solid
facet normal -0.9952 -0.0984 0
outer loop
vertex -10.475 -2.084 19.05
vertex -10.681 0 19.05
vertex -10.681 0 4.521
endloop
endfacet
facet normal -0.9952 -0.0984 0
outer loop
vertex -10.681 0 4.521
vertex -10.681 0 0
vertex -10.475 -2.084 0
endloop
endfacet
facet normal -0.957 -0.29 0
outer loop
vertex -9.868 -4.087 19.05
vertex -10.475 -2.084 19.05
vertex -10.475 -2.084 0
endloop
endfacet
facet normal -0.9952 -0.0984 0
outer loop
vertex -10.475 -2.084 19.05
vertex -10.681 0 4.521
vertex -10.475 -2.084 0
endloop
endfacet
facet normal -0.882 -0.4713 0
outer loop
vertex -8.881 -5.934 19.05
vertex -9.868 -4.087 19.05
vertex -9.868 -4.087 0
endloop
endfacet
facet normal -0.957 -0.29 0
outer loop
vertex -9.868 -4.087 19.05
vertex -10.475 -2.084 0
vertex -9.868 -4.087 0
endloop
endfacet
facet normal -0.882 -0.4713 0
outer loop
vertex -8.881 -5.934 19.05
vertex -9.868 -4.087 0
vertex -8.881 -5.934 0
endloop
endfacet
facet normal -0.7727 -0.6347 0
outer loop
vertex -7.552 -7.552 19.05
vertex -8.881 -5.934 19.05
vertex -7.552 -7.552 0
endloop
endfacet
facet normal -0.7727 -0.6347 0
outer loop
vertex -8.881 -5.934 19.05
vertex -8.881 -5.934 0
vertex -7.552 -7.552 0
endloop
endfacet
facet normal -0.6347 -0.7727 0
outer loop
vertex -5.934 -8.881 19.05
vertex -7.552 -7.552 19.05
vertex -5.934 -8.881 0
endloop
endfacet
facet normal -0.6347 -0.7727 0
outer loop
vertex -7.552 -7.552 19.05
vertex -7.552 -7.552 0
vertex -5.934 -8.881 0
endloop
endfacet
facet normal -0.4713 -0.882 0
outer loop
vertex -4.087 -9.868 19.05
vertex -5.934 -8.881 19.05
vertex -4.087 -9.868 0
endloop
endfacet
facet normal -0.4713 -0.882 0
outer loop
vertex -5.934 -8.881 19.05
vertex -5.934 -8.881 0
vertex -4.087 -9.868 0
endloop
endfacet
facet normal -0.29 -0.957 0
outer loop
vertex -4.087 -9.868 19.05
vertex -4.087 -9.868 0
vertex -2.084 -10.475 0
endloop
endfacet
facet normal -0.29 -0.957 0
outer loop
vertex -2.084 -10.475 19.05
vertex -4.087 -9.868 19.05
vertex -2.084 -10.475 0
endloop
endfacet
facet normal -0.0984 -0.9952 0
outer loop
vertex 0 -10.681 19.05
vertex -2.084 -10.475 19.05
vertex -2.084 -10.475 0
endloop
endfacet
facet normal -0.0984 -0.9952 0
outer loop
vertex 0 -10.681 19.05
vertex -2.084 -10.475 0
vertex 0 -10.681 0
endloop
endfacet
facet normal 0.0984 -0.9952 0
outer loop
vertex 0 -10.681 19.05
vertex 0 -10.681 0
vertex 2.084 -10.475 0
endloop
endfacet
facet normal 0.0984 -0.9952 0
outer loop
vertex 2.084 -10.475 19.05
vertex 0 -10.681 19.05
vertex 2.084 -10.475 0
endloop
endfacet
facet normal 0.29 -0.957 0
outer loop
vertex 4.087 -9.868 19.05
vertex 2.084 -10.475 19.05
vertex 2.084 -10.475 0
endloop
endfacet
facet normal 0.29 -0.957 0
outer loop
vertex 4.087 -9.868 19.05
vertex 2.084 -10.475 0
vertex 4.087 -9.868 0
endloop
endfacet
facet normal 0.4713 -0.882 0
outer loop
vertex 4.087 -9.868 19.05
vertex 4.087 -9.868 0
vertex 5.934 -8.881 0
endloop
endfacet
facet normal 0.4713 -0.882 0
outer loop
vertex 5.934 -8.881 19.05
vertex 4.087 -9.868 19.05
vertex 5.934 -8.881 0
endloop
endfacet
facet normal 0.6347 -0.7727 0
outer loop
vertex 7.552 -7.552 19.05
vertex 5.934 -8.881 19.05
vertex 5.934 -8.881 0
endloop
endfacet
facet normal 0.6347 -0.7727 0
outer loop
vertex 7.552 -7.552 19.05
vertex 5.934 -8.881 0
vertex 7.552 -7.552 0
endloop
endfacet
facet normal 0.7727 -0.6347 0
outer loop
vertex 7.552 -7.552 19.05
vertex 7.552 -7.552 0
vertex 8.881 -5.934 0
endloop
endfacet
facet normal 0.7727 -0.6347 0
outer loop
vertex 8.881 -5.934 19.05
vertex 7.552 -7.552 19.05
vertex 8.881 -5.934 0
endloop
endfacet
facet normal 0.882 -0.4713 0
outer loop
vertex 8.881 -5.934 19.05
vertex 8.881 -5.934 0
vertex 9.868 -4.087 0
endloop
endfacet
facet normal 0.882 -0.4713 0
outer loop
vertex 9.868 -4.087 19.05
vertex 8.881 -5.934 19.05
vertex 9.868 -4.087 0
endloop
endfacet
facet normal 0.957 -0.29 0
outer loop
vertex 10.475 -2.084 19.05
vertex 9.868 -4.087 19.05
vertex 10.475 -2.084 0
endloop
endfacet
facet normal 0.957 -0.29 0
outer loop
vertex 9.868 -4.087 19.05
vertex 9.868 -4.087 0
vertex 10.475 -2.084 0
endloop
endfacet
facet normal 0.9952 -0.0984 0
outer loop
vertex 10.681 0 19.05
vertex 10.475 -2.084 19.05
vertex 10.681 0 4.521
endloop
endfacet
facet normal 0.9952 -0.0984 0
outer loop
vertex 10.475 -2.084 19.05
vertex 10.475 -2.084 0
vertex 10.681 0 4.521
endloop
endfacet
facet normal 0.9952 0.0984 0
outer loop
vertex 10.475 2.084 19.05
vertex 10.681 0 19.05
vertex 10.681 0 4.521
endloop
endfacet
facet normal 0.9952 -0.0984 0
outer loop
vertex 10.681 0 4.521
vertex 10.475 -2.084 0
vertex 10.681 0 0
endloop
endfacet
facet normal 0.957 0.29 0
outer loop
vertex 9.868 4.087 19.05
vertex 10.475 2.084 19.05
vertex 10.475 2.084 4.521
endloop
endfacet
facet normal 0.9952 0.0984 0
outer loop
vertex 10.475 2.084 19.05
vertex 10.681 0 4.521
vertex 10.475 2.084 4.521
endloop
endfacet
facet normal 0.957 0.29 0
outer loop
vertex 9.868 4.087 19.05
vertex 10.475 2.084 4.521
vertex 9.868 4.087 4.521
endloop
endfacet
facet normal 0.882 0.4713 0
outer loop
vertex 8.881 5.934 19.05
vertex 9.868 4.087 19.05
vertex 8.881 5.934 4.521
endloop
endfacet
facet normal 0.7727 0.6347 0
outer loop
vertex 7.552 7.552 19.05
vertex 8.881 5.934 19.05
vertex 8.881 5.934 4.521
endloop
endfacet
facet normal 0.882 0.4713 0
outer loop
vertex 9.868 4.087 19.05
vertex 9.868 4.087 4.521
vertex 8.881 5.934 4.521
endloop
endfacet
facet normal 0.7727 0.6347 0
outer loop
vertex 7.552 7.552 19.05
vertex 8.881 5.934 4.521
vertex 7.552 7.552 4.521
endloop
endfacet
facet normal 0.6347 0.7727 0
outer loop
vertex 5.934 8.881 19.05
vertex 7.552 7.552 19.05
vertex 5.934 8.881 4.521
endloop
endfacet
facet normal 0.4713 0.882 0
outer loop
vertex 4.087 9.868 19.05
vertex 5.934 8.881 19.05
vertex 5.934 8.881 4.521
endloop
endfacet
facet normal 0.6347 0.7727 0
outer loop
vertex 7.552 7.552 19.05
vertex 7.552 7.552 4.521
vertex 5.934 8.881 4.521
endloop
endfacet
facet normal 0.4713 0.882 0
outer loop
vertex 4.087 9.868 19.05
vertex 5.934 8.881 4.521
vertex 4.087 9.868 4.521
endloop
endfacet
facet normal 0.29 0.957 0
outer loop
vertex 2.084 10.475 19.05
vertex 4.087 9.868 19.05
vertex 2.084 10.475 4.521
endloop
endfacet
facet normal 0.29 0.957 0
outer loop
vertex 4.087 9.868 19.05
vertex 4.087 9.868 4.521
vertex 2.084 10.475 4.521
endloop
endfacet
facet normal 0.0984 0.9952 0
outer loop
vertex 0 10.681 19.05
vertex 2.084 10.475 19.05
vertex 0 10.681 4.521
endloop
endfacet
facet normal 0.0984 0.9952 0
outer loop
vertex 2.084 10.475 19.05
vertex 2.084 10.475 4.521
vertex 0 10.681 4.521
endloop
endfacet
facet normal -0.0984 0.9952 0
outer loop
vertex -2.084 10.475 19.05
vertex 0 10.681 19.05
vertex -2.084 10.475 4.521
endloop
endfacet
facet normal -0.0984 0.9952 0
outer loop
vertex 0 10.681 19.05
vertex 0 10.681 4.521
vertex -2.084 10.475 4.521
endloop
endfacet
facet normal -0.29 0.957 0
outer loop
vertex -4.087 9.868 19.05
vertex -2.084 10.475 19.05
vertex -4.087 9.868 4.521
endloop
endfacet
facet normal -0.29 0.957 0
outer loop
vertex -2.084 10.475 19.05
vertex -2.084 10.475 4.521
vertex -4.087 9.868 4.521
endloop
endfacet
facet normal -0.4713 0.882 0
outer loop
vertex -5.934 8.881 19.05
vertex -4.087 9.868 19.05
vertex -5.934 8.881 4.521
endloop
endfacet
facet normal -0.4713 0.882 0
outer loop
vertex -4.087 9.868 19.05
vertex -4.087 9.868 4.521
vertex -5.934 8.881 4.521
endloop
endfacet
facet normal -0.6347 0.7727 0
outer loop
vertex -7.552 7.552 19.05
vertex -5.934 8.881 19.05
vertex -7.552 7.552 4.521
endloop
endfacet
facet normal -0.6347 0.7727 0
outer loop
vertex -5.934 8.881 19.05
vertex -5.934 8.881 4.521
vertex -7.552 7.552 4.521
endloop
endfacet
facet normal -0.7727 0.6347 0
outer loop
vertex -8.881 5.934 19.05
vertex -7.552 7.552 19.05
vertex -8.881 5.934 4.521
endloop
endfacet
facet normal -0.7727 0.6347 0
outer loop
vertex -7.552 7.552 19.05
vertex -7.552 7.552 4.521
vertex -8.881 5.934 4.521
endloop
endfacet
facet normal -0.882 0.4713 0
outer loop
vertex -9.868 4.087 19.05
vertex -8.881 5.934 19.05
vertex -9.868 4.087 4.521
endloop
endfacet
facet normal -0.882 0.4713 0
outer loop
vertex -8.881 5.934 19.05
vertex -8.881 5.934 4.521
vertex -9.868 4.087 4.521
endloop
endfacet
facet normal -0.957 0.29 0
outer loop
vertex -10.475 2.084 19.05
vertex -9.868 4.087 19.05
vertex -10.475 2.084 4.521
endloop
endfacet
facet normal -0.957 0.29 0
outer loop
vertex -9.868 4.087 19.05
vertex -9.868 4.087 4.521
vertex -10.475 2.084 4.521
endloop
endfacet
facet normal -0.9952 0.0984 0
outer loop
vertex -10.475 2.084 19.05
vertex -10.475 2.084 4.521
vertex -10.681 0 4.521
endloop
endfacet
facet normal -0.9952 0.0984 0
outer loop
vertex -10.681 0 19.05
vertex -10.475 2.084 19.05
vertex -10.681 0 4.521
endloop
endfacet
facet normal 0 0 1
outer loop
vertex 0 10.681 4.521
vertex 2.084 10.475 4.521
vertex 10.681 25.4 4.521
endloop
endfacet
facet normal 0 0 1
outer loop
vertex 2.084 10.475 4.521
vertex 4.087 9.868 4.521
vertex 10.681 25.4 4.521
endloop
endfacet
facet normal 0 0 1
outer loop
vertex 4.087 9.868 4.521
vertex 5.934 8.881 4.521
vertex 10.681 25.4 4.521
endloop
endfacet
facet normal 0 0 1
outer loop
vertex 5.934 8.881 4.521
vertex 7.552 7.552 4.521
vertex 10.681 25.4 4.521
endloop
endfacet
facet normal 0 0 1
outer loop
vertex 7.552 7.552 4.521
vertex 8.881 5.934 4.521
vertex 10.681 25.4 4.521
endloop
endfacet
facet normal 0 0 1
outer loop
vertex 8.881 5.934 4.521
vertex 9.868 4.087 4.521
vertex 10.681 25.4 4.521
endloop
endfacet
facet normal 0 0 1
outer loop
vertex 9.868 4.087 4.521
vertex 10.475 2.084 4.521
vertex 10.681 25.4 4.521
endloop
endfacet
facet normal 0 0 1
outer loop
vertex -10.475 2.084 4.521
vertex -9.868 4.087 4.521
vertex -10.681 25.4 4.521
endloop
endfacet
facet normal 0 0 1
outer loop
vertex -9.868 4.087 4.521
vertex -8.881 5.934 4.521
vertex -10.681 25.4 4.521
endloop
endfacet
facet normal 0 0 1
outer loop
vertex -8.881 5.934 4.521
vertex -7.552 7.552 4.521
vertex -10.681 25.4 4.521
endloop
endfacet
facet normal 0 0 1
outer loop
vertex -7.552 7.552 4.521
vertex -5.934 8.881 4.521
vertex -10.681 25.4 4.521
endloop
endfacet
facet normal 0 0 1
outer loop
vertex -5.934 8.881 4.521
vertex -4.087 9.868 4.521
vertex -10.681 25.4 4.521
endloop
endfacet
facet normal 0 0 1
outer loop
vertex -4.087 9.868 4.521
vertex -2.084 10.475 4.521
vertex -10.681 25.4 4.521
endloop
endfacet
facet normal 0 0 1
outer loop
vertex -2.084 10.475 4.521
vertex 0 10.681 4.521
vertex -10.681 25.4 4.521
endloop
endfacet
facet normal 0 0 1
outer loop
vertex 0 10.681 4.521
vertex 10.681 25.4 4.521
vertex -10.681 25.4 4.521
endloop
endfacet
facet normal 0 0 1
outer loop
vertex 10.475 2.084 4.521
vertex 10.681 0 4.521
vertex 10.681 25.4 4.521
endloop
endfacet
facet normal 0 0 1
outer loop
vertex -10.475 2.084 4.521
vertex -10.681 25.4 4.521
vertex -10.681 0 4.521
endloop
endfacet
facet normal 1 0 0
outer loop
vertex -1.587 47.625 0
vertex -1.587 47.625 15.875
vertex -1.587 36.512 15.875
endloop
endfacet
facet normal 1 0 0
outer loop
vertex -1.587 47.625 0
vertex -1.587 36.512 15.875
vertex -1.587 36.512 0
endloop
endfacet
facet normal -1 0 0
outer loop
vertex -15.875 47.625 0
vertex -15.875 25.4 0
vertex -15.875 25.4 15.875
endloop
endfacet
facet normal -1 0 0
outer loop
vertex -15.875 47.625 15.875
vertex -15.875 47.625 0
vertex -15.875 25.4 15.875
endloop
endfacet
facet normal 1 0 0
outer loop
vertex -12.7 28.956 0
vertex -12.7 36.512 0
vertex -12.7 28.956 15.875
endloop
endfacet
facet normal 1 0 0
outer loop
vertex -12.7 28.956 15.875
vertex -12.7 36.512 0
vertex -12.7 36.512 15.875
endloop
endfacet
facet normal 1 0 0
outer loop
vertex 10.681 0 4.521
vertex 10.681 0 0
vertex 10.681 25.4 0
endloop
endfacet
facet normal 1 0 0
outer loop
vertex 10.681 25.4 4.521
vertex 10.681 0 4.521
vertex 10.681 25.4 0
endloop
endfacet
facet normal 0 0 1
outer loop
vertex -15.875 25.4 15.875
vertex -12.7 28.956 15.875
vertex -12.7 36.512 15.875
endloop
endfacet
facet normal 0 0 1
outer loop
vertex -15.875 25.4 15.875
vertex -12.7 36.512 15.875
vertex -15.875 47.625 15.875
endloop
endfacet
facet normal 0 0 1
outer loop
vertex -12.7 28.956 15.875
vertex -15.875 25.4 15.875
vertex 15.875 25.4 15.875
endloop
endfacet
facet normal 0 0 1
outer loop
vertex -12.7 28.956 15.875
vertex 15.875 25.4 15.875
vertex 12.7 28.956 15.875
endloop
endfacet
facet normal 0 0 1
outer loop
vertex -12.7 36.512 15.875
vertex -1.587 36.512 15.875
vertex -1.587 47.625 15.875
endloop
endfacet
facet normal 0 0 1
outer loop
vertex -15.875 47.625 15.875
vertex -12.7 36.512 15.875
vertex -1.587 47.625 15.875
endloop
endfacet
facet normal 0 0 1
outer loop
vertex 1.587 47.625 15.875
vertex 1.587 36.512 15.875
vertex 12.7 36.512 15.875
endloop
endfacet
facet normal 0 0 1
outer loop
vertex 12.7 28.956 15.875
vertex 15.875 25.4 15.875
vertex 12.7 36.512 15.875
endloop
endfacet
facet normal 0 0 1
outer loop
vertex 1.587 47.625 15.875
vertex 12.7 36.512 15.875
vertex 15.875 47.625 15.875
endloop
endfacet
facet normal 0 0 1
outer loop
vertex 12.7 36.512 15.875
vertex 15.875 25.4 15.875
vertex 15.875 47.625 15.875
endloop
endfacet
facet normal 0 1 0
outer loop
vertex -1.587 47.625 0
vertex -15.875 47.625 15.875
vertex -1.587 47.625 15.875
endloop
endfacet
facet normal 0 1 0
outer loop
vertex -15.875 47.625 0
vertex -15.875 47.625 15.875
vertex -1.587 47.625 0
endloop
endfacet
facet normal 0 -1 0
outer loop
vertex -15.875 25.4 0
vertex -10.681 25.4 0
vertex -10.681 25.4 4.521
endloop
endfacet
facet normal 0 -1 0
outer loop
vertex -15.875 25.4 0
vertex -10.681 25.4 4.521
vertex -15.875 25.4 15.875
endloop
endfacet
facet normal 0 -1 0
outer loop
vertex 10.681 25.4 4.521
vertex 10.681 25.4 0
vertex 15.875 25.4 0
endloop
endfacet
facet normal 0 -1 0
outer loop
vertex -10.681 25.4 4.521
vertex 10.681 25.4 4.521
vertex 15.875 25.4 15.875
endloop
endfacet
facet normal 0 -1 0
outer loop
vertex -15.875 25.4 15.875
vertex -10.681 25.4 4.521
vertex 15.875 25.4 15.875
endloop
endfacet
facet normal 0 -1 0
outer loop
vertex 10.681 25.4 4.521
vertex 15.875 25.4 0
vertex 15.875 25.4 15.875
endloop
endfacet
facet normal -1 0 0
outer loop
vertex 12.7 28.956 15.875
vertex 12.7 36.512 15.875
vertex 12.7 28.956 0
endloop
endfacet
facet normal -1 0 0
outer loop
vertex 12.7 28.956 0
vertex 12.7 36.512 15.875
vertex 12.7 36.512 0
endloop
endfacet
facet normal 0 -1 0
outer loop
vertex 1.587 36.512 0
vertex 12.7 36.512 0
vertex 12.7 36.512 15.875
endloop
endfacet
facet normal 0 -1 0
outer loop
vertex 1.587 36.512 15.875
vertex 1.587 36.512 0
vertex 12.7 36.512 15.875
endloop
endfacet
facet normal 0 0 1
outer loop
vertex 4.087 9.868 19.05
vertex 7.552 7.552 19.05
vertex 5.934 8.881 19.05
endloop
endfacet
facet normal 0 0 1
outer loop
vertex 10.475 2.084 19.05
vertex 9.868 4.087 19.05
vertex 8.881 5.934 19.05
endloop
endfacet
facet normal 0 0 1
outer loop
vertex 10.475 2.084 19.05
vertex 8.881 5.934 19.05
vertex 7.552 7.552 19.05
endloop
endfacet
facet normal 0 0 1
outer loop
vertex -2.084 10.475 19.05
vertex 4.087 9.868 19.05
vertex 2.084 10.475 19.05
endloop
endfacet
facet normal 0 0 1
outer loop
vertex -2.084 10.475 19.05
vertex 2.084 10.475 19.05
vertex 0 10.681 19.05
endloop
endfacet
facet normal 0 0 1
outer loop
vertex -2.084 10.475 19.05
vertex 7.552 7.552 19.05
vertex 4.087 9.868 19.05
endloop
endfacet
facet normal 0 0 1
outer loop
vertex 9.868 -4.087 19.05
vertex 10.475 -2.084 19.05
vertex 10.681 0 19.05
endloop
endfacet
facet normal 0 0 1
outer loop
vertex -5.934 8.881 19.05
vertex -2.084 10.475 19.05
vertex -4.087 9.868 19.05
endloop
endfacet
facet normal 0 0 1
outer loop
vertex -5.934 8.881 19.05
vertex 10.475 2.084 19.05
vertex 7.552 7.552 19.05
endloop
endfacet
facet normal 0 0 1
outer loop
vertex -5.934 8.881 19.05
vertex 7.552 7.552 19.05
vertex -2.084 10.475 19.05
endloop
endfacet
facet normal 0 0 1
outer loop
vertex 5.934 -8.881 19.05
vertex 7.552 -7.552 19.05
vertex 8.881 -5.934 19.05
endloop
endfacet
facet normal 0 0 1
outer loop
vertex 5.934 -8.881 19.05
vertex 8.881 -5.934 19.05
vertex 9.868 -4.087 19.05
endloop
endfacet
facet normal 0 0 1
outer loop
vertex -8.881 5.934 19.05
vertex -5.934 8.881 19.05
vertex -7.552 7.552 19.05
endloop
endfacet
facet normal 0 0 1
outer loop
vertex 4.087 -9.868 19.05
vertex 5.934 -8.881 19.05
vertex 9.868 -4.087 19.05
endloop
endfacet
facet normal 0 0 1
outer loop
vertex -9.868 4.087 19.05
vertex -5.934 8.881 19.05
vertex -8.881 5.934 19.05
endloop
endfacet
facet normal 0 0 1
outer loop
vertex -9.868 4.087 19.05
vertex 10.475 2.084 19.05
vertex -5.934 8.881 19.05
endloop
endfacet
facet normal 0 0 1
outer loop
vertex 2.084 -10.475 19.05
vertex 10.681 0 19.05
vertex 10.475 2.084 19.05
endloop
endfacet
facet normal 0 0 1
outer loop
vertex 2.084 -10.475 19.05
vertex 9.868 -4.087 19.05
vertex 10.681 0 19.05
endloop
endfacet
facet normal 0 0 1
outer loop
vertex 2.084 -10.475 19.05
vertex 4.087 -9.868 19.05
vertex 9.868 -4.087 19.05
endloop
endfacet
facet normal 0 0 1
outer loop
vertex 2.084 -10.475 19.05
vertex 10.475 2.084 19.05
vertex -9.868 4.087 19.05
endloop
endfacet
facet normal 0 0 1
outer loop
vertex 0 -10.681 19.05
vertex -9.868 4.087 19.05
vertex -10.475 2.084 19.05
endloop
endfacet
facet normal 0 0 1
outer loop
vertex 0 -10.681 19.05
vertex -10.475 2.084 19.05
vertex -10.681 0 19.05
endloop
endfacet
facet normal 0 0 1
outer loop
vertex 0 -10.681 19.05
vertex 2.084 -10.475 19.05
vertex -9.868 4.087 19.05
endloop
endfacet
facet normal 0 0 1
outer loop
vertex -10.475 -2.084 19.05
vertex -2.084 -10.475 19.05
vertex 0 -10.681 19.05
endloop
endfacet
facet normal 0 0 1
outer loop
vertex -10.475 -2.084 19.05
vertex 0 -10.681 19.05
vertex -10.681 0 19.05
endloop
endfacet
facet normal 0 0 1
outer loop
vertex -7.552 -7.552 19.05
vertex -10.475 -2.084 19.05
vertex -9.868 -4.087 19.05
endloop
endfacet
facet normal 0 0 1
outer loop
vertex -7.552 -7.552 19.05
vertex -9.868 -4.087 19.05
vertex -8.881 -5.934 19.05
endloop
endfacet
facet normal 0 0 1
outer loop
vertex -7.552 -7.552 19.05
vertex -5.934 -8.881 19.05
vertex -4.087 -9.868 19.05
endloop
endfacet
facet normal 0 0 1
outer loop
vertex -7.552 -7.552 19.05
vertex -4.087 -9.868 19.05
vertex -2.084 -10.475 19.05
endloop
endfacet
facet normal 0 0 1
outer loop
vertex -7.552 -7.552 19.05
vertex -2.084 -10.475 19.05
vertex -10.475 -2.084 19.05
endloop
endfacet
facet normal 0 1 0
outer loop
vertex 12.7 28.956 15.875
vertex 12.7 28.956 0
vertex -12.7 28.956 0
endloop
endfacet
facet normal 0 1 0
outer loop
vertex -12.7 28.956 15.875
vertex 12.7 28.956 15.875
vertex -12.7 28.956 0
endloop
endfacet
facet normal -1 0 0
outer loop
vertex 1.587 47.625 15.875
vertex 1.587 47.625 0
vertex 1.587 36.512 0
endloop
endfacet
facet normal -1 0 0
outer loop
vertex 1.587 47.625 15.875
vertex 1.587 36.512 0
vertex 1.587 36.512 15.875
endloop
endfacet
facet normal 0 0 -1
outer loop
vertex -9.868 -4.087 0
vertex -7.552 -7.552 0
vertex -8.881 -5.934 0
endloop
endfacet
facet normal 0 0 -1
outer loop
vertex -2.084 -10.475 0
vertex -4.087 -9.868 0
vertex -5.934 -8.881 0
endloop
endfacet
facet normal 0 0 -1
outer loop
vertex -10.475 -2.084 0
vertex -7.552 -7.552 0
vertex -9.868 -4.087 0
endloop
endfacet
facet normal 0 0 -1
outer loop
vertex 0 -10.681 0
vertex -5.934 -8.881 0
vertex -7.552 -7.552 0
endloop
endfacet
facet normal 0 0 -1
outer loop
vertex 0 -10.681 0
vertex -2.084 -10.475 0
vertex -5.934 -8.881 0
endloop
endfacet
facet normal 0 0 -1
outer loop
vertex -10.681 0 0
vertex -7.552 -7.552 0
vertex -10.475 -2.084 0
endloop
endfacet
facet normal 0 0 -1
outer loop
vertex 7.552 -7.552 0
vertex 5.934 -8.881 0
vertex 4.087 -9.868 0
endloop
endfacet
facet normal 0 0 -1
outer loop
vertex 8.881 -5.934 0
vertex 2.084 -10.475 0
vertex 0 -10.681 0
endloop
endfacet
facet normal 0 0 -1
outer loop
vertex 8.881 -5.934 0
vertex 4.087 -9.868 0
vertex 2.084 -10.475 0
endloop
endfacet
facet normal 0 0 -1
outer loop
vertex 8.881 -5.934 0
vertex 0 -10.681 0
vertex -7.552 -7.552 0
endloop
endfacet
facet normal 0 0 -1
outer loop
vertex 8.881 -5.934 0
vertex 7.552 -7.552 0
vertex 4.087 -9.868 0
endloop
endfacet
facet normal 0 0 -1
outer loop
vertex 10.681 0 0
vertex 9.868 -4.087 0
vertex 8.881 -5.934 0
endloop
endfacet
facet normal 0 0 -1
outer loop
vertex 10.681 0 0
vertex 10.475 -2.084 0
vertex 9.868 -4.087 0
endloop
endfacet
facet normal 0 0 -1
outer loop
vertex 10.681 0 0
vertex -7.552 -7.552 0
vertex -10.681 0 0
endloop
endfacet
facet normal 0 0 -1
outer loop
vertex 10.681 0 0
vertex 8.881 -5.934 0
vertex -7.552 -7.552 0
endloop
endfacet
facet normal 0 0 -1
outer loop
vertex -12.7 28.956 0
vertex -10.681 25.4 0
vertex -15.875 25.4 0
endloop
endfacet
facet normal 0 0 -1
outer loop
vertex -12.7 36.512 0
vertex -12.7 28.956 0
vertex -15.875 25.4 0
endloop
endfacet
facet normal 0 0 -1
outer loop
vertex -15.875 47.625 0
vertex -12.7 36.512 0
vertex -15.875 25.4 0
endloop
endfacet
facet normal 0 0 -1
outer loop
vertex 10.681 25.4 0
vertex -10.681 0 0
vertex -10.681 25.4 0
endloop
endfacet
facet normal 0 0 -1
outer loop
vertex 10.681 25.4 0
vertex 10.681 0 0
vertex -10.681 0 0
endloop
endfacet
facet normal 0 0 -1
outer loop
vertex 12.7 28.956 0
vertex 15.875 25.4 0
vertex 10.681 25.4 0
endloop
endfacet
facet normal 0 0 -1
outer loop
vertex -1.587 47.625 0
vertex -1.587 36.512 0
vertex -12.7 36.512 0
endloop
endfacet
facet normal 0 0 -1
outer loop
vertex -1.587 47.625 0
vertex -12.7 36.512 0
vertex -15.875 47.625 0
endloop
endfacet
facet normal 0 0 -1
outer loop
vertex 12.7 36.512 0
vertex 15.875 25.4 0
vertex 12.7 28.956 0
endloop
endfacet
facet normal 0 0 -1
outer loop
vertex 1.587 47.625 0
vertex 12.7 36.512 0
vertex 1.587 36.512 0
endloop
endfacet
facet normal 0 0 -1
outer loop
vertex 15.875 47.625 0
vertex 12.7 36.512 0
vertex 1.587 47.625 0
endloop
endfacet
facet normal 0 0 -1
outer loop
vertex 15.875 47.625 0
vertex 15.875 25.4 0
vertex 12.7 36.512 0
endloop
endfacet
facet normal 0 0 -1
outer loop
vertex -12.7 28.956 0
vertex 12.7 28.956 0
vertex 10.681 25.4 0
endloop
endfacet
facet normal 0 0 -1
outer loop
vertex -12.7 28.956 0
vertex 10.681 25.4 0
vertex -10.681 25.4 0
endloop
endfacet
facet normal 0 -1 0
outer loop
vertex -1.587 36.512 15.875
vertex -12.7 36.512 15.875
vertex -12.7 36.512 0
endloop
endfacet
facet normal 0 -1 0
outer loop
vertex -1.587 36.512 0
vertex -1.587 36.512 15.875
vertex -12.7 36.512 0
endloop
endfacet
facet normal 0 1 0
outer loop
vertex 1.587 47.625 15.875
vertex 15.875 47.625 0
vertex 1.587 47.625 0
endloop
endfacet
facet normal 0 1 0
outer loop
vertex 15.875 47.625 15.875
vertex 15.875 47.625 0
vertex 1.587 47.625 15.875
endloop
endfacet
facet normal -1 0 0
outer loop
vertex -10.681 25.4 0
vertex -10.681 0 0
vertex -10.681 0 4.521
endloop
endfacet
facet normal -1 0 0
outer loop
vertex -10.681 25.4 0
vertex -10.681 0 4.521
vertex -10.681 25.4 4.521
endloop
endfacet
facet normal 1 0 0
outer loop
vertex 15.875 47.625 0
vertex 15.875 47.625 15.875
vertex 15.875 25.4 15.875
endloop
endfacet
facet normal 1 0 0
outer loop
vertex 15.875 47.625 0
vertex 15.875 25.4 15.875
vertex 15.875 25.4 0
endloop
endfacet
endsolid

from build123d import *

# Parameters (mm, degrees)
SKETCH1_R           = 10.6807
BOSS_EXTRUDE1_DEPTH = 19.05
SKETCH2_W           = 21.3614
SKETCH2_H           = 25.4
BOSS_EXTRUDE2_DEPTH = 4.5212
BOSS_EXTRUDE3_DEPTH = 3.556
SKETCH4_W           = 15.875
SKETCH4_H           = 22.225
BOSS_EXTRUDE4_DEPTH = 3.175
SKETCH5_W           = 15.875
SKETCH5_H           = 22.225
BOSS_EXTRUDE5_DEPTH = 3.175
SKETCH7_W           = 15.875
SKETCH7_H           = 11.1125
BOSS_EXTRUDE6_DEPTH = 11.1125
SKETCH8_W           = 15.875
SKETCH8_H           = 11.1125
BOSS_EXTRUDE7_DEPTH = 11.1125


with BuildPart() as part:
    # Sketch1 → Boss-Extrude1 (new body)
    with BuildSketch(Plane.XY):
        with Locations(Location((0, 0, 0), (0, 0, 180))):
            Circle(SKETCH1_R)
    extrude(amount=BOSS_EXTRUDE1_DEPTH)

    # Sketch2 → Boss-Extrude2 (add)
    with BuildSketch(Plane(origin=(0, 0, 0), x_dir=(-1, 0, 0), z_dir=(0, 0, -1))):
        with Locations((0, 12.7)):
            Rectangle(SKETCH2_W, SKETCH2_H)
    extrude(amount=-BOSS_EXTRUDE2_DEPTH)

    # Sketch3 → Boss-Extrude3 (add)
    with BuildSketch(Plane(origin=(0, 25.4, 0), x_dir=(1, 0, 0), z_dir=(0, 1, 0))):
        Polygon((0, 0), (12.7, 0), (12.7, -15.875), (-12.7, -15.875), (-12.7, 0), align=None)
    extrude(amount=BOSS_EXTRUDE3_DEPTH)

    # Sketch4 → Boss-Extrude4 (add)
    with BuildSketch(Plane(origin=(12.7, 0, 0), x_dir=(0, 0, -1), z_dir=(1, 0, 0))):
        with Locations((-7.9375, 36.5125)):
            Rectangle(SKETCH4_W, SKETCH4_H)
    extrude(amount=BOSS_EXTRUDE4_DEPTH)

    # Sketch5 → Boss-Extrude5 (add)
    with BuildSketch(Plane.ZY.offset(12.7)):
        with Locations((7.9375, 36.5125)):
            Rectangle(SKETCH5_W, SKETCH5_H)
    extrude(amount=BOSS_EXTRUDE5_DEPTH)

    # Sketch7 → Boss-Extrude6 (add)
    with BuildSketch(Plane(origin=(-12.7, 0, 0), x_dir=(0, 0, -1), z_dir=(1, 0, 0))):
        with Locations((-7.9375, 42.06875)):
            Rectangle(SKETCH7_W, SKETCH7_H)
    extrude(amount=BOSS_EXTRUDE6_DEPTH)

    # Sketch8 → Boss-Extrude7 (add)
    with BuildSketch(Plane.ZY.offset(-12.7)):
        with Locations((7.9375, 42.06875)):
            Rectangle(SKETCH8_W, SKETCH8_H)
    extrude(amount=BOSS_EXTRUDE7_DEPTH)


solid = part.part
